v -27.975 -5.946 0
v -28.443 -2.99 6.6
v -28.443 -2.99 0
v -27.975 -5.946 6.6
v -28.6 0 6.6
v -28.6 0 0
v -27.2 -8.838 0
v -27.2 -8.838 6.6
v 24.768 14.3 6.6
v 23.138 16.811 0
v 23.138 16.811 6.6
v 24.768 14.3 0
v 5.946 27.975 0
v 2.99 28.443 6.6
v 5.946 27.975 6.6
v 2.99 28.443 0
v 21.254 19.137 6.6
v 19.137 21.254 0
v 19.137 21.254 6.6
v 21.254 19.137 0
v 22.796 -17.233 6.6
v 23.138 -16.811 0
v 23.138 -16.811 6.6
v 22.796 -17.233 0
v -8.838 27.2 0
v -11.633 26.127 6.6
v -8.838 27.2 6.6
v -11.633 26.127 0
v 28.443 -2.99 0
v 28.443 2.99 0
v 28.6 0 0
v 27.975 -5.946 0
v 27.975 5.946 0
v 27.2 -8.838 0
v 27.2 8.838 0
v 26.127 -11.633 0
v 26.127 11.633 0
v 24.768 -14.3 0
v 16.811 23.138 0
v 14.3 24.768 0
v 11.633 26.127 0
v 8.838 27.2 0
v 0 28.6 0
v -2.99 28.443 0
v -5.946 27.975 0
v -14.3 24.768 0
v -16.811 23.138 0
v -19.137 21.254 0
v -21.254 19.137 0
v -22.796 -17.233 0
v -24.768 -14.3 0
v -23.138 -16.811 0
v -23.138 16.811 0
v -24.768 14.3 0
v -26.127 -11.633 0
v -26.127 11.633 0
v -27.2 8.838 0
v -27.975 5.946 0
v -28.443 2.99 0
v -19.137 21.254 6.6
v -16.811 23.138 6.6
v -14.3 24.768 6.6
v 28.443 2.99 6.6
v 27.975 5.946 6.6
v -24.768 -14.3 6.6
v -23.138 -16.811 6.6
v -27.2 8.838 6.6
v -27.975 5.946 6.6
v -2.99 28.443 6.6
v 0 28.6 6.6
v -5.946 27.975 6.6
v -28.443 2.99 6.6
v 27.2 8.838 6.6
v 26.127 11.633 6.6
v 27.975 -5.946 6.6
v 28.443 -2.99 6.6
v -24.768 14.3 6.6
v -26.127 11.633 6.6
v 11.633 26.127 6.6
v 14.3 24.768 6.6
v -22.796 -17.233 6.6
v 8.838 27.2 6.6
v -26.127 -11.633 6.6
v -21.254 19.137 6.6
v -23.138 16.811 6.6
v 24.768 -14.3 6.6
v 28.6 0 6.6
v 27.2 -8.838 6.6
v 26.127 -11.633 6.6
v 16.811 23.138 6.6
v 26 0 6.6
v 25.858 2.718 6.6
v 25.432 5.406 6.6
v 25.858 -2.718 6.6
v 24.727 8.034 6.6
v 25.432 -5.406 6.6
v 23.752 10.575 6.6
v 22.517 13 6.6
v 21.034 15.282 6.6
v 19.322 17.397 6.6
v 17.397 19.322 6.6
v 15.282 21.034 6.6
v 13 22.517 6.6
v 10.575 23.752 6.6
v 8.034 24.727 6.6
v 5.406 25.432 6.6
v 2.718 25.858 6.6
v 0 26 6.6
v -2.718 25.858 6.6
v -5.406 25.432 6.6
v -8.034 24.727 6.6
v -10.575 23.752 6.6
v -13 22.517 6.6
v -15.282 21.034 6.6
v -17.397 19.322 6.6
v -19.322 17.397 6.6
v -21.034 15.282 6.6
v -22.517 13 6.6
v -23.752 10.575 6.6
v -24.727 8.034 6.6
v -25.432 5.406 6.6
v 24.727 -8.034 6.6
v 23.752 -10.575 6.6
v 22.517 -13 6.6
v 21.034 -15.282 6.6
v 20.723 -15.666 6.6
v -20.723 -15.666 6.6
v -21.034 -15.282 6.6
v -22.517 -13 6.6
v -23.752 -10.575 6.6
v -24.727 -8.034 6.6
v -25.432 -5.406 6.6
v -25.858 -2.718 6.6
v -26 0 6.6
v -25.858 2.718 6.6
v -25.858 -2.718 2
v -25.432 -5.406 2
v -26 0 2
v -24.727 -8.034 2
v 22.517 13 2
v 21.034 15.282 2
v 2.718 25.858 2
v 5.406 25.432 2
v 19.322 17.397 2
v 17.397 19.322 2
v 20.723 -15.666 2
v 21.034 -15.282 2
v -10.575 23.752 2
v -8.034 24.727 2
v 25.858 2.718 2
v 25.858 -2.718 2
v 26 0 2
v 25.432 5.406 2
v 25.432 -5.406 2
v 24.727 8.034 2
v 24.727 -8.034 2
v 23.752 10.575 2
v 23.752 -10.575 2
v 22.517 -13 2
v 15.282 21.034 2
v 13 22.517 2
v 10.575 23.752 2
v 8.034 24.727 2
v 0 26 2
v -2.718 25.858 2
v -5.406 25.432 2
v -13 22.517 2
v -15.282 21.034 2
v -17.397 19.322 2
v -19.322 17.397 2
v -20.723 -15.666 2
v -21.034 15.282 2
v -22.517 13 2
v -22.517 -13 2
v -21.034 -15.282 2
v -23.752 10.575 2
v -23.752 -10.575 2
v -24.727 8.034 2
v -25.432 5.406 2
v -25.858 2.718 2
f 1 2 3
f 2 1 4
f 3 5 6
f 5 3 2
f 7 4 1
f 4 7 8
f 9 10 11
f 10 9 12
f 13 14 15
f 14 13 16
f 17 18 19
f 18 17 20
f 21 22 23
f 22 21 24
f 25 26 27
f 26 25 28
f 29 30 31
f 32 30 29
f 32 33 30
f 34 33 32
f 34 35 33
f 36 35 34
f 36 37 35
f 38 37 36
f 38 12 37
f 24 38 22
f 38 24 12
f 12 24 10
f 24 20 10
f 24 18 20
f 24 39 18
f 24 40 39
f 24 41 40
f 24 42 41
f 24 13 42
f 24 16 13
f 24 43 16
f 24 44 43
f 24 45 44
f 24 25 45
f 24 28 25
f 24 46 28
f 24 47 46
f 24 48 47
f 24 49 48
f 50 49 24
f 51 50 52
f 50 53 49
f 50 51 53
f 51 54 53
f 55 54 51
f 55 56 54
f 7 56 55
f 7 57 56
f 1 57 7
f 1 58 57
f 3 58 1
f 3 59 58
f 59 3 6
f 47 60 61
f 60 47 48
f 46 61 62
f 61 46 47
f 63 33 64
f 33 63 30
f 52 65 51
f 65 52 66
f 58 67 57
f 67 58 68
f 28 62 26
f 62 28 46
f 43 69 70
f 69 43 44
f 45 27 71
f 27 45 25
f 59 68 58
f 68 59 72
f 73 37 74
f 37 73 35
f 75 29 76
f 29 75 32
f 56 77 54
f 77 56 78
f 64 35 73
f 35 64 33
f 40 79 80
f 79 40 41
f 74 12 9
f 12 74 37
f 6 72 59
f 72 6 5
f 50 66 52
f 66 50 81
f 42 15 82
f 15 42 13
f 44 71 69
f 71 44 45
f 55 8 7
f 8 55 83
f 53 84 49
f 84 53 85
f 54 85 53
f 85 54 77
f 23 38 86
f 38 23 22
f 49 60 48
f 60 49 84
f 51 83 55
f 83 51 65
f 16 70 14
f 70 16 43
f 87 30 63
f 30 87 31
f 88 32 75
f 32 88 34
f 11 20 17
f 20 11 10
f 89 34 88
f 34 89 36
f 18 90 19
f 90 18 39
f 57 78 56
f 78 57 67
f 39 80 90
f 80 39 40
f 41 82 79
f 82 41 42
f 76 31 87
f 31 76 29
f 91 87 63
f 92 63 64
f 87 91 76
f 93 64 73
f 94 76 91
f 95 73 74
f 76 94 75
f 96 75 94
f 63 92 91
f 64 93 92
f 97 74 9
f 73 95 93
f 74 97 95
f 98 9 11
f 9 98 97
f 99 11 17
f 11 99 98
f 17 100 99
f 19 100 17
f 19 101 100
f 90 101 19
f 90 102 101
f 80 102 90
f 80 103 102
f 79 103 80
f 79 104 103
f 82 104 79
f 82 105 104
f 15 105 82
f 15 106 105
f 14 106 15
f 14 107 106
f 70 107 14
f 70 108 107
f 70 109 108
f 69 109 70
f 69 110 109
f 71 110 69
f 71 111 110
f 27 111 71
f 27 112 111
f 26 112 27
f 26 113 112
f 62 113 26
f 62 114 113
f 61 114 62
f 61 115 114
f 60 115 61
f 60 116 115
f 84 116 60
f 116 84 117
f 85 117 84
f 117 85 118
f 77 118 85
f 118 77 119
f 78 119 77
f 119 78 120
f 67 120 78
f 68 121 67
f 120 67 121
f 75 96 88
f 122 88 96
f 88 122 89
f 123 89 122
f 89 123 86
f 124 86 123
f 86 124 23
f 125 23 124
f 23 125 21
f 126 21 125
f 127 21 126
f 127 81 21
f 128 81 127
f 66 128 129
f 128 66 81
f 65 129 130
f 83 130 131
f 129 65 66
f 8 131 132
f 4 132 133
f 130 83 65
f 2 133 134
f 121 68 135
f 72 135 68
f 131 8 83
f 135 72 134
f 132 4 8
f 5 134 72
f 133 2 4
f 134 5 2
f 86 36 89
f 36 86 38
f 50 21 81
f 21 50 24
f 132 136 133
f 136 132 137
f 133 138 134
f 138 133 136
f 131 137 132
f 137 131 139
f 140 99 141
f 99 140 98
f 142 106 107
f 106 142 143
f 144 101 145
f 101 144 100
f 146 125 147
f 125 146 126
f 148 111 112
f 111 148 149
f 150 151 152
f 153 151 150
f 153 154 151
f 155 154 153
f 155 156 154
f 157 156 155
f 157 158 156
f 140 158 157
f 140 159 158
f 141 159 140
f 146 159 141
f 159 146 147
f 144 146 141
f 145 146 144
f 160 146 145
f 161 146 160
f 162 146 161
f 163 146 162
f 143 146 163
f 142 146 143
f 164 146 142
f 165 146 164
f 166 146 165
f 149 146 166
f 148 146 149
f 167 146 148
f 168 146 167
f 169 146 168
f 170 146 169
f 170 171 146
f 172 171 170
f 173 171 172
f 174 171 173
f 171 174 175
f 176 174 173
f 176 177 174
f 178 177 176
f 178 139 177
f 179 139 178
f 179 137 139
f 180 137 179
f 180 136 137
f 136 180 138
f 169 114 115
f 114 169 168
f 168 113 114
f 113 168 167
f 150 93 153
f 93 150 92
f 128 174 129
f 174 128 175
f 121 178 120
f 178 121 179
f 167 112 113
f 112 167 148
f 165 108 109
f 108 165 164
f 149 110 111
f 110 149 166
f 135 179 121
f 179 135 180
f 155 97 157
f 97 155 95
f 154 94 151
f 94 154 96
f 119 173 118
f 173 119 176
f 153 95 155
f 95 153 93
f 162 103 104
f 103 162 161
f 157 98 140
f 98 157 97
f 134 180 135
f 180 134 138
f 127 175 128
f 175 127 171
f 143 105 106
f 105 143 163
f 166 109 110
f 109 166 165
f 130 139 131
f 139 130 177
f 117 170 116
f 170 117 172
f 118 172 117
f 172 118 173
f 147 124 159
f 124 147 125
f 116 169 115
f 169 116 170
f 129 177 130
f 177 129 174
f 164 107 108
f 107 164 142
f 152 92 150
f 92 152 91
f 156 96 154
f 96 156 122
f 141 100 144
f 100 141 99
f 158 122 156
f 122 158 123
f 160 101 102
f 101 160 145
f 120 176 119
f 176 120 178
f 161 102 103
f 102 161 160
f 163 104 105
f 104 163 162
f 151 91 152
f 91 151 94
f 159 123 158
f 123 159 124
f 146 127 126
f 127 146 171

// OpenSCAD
$fn=60;


eye_base_cut=41.5;
eye_base_diameter=52;
eye_base_height=6; // minus plate height
plate_height=2;

eye_base_cut=26-26*cos(106/2);

// 2*eye_base_radius*sin(106/2) ~ 41.5
// 2*eye_base_radiu/41.5 ~ 1/sin(106/2)
// 41.5/2eye_base_radius ~ sin(106/2)
// asin(41.5/eye_base_diameter)*2 = angle

eye_base_cut=26-26*cos(asin(41.5/52));

echo(eye_base_cut);

module eye_base()
{
    difference()
    {
        cylinder(d=eye_base_diameter, h=eye_base_height);
        translate([-eye_base_diameter/2,eye_base_diameter/2-eye_base_cut,0])
            cube([eye_base_diameter,eye_base_diameter,eye_base_height]);


    }
}



difference()
        {
            scale(1.1) rotate(180,[0,0,1]) eye_base();
            translate([0,0,plate_height])  rotate(180,[0,0,1]) eye_base();
        }
